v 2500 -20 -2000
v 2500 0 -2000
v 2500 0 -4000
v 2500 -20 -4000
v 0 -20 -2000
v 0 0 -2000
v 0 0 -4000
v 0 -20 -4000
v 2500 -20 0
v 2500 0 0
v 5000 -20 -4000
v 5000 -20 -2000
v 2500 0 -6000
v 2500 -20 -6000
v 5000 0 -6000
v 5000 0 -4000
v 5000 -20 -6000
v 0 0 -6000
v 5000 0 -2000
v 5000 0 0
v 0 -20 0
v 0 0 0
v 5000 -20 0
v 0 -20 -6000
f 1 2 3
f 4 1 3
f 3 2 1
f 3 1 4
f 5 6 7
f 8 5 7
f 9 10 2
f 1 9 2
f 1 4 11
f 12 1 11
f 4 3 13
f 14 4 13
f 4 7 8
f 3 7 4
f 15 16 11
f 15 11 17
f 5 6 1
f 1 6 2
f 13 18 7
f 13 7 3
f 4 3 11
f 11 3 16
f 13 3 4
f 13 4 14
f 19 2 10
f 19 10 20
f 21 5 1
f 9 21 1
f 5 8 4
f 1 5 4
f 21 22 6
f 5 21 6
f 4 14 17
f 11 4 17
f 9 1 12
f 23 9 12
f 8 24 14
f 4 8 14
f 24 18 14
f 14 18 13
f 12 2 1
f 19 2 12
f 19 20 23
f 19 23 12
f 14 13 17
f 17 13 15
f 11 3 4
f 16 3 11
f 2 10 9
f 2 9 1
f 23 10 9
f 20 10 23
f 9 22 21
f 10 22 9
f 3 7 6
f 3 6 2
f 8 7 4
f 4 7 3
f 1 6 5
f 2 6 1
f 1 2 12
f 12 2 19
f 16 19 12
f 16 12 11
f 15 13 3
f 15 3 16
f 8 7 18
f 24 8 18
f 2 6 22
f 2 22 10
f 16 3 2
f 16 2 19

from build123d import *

# Parameters (mm, degrees)
SKETCH_1_W               = 2500
SKETCH_1_H               = 2000
EXTRUDE_1_DEPTH          = 20
PATTERN_LINEAR_2_COUNT   = 3
PATTERN_LINEAR_2_PITCH   = 2000
PATTERN_LINEAR_2_2_COUNT = 2
PATTERN_LINEAR_2_2_PITCH = 2500


with BuildPart() as part:
    # 草图1 → 凸台-拉伸1 (new body)
    with BuildSketch(Plane(origin=(0, 0, 0), x_dir=(1, 0, 0), z_dir=(0, 1, 0))):
        with Locations((1250, 1000)):
            Rectangle(SKETCH_1_W, SKETCH_1_H)
    extrude(amount=-EXTRUDE_1_DEPTH)


with BuildPart() as pattern_linear_2_1:
    # 阵列(线性)2: pattern copy
    add(part.part.moved(Location(Vector(0, 0, -1) * (1 * PATTERN_LINEAR_2_PITCH))))


with BuildPart() as pattern_linear_2_2:
    # 阵列(线性)2: pattern copy
    add(part.part.moved(Location(Vector(0, 0, -1) * (2 * PATTERN_LINEAR_2_PITCH))))


with BuildPart() as pattern_linear_2_2_1:
    # Pattern Linear 2 2: pattern copy
    add(part.part.moved(Location(Vector(1, 0, 0) * (1 * PATTERN_LINEAR_2_2_PITCH))))


with BuildPart() as pattern_linear_2_2_2:
    # Pattern Linear 2 2: pattern copy
    add(pattern_linear_2_1.part.moved(Location(Vector(1, 0, 0) * (1 * PATTERN_LINEAR_2_2_PITCH))))


with BuildPart() as pattern_linear_2_2_3:
    # Pattern Linear 2 2: pattern copy
    add(pattern_linear_2_2.part.moved(Location(Vector(1, 0, 0) * (1 * PATTERN_LINEAR_2_2_PITCH))))


solid = Compound([part.part, pattern_linear_2_1.part, pattern_linear_2_2.part, pattern_linear_2_2_1.part, pattern_linear_2_2_2.part, pattern_linear_2_2_3.part])
